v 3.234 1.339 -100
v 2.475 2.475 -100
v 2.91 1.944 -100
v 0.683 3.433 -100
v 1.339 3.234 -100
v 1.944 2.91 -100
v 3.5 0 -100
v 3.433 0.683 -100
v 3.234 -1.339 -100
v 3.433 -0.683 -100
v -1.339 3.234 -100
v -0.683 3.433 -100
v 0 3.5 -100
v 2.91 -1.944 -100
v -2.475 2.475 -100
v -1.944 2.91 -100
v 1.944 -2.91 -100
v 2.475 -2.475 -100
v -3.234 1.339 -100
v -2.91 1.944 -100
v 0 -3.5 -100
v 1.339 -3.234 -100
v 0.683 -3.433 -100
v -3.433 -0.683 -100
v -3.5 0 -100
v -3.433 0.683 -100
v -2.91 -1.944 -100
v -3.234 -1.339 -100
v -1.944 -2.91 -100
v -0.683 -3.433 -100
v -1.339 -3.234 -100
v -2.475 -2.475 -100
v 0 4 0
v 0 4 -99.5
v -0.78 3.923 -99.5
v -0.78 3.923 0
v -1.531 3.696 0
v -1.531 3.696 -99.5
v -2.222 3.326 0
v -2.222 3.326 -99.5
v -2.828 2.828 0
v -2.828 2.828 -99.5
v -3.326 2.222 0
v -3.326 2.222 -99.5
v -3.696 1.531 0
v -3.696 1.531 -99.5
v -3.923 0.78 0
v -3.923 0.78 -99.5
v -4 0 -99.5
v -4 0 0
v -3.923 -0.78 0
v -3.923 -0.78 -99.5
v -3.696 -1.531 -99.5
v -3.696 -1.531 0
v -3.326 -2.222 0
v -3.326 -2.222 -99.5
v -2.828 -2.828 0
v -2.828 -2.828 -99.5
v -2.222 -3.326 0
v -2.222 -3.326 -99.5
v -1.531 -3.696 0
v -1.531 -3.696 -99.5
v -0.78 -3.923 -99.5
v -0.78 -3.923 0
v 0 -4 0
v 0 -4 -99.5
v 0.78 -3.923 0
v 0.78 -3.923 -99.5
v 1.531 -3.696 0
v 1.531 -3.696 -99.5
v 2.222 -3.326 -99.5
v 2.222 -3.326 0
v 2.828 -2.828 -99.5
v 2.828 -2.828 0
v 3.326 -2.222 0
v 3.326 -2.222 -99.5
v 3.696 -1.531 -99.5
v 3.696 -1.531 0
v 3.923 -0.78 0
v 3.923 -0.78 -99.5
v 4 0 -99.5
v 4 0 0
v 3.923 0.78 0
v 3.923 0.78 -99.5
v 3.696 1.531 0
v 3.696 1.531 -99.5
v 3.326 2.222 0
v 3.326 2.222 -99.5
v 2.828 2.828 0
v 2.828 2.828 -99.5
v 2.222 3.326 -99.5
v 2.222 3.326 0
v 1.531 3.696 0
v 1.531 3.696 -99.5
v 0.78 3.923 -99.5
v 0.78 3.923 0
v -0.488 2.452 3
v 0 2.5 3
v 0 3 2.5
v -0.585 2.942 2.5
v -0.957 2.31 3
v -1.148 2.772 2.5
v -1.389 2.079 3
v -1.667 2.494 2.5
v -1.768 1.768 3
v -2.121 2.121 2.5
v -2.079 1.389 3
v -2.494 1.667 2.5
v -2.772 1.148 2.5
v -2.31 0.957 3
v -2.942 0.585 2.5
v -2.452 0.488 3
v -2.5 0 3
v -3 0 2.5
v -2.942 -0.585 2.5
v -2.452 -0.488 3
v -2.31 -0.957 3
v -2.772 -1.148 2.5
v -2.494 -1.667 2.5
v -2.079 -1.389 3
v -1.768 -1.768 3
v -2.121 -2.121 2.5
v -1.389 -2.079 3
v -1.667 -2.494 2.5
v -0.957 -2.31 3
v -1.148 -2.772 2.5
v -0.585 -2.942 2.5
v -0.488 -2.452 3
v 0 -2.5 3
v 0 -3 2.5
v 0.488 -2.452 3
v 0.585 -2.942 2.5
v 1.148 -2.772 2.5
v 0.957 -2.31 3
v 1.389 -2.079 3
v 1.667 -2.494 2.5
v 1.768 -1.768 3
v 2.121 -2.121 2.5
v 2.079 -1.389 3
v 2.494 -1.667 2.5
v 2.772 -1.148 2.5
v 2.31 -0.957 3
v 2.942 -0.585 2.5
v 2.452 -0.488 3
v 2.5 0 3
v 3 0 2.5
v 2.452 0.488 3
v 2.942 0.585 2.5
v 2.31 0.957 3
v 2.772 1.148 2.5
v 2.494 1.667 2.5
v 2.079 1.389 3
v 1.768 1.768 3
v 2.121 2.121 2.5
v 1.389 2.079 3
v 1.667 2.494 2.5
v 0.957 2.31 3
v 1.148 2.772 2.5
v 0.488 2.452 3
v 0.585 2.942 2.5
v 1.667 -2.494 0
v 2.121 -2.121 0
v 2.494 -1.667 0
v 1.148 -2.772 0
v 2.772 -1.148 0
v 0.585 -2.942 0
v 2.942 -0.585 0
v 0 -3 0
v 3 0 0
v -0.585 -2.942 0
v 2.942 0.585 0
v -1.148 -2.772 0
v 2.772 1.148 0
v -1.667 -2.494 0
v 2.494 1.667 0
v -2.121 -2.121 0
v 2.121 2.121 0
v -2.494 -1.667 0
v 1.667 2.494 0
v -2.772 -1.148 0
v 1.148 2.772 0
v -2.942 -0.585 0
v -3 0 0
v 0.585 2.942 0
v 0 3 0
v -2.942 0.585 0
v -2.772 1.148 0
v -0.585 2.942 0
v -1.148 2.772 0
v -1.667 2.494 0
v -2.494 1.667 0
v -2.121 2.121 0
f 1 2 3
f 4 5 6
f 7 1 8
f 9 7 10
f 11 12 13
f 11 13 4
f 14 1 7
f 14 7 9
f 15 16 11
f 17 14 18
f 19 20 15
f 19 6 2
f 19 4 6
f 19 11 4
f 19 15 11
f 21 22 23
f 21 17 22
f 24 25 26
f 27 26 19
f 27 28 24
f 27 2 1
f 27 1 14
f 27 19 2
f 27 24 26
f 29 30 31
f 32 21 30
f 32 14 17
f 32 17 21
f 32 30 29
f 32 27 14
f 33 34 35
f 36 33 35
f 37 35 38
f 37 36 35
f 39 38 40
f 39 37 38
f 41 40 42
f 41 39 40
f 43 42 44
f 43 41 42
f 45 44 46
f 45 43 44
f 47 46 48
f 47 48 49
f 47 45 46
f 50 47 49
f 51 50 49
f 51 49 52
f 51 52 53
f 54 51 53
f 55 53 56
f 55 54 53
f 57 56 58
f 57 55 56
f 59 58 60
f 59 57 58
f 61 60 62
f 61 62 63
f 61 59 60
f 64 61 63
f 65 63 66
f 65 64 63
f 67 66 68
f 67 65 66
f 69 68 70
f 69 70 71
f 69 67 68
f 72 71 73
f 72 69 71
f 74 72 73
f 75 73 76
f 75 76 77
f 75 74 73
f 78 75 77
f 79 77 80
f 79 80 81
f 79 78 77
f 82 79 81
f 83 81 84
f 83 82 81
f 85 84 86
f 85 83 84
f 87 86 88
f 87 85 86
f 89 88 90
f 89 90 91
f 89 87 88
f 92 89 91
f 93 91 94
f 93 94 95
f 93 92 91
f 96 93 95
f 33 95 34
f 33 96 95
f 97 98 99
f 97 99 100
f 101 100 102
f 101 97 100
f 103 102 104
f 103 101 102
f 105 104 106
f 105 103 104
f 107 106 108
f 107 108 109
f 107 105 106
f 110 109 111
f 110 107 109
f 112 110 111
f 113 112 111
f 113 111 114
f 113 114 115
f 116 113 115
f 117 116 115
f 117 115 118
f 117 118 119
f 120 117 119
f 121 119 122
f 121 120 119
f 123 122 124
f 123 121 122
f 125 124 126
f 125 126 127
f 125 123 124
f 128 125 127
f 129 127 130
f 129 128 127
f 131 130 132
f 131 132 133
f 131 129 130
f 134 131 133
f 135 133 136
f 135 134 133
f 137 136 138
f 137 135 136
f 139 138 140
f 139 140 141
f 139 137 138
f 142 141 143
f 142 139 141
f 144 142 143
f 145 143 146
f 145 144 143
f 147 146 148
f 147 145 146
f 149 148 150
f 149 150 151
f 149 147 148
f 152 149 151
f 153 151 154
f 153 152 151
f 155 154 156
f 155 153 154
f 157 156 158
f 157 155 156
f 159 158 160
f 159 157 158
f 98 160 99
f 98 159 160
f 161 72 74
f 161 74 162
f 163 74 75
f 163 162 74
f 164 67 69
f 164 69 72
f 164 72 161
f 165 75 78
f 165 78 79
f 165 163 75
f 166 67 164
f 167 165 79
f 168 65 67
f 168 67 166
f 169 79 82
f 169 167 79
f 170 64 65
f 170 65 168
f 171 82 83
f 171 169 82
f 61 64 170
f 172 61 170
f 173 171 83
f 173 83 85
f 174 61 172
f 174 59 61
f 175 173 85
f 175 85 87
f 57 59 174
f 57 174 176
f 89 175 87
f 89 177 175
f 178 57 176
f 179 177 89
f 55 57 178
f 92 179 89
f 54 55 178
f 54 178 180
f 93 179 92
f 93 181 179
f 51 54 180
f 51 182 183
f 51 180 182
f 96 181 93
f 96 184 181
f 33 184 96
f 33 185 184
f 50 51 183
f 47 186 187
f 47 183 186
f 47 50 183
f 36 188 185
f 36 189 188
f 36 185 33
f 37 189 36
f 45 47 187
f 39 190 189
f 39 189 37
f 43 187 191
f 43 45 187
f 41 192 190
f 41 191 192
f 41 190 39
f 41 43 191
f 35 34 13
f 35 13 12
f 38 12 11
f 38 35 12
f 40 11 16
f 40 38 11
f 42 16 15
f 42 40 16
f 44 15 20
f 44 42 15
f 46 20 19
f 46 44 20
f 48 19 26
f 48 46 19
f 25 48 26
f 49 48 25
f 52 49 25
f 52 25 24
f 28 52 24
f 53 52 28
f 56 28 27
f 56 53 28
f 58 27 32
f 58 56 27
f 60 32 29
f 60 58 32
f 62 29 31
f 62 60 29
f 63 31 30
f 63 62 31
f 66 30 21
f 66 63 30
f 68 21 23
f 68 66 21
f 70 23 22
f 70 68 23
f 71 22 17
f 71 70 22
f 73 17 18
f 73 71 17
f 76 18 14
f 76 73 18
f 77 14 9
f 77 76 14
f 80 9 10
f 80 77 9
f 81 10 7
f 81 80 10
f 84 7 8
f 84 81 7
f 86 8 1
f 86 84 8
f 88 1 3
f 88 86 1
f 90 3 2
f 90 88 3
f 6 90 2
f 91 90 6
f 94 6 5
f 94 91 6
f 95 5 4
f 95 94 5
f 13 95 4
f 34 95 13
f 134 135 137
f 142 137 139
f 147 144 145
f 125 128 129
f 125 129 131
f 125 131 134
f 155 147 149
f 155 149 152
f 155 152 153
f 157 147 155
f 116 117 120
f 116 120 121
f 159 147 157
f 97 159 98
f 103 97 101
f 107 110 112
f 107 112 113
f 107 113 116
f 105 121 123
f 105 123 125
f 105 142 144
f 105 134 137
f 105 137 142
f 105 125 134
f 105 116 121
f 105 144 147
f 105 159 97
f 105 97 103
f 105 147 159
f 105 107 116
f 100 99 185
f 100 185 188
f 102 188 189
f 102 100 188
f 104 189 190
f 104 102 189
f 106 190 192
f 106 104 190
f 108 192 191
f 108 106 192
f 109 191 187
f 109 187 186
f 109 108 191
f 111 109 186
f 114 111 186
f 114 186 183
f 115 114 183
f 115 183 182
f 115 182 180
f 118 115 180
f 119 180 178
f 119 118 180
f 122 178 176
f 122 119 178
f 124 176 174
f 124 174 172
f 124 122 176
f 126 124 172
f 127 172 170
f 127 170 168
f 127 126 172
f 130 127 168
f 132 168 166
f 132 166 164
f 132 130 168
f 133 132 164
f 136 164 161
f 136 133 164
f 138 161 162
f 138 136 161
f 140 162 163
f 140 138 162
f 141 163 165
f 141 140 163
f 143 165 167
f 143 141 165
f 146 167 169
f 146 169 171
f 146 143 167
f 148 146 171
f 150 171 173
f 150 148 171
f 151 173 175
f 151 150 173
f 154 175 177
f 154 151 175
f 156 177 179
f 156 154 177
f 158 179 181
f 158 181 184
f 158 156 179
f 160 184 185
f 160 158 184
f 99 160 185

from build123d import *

# Parameters (mm, degrees)
CHAMFER1_SIZE = 0.5


with BuildPart() as part:
    # Sketch1 → Revolve1 (revolve)
    with BuildSketch(Plane(origin=(0, 0, 0), x_dir=(0, 0, -1), z_dir=(1, 0, 0))):
        Polygon((-3, 0), (100, 0), (100, 4), (0, 4), (0, 3), (-3, 3), align=None)
    revolve(axis=Axis((0, 0, 3), (0, 0, 1)))

    # Chamfer1
    chamfer1_edges = [part.edges().sort_by_distance(p)[0] for p in [
        (0, -4, -100),
        (0, -3, 3),
    ]]
    chamfer(chamfer1_edges, length=CHAMFER1_SIZE)


solid = part.part
